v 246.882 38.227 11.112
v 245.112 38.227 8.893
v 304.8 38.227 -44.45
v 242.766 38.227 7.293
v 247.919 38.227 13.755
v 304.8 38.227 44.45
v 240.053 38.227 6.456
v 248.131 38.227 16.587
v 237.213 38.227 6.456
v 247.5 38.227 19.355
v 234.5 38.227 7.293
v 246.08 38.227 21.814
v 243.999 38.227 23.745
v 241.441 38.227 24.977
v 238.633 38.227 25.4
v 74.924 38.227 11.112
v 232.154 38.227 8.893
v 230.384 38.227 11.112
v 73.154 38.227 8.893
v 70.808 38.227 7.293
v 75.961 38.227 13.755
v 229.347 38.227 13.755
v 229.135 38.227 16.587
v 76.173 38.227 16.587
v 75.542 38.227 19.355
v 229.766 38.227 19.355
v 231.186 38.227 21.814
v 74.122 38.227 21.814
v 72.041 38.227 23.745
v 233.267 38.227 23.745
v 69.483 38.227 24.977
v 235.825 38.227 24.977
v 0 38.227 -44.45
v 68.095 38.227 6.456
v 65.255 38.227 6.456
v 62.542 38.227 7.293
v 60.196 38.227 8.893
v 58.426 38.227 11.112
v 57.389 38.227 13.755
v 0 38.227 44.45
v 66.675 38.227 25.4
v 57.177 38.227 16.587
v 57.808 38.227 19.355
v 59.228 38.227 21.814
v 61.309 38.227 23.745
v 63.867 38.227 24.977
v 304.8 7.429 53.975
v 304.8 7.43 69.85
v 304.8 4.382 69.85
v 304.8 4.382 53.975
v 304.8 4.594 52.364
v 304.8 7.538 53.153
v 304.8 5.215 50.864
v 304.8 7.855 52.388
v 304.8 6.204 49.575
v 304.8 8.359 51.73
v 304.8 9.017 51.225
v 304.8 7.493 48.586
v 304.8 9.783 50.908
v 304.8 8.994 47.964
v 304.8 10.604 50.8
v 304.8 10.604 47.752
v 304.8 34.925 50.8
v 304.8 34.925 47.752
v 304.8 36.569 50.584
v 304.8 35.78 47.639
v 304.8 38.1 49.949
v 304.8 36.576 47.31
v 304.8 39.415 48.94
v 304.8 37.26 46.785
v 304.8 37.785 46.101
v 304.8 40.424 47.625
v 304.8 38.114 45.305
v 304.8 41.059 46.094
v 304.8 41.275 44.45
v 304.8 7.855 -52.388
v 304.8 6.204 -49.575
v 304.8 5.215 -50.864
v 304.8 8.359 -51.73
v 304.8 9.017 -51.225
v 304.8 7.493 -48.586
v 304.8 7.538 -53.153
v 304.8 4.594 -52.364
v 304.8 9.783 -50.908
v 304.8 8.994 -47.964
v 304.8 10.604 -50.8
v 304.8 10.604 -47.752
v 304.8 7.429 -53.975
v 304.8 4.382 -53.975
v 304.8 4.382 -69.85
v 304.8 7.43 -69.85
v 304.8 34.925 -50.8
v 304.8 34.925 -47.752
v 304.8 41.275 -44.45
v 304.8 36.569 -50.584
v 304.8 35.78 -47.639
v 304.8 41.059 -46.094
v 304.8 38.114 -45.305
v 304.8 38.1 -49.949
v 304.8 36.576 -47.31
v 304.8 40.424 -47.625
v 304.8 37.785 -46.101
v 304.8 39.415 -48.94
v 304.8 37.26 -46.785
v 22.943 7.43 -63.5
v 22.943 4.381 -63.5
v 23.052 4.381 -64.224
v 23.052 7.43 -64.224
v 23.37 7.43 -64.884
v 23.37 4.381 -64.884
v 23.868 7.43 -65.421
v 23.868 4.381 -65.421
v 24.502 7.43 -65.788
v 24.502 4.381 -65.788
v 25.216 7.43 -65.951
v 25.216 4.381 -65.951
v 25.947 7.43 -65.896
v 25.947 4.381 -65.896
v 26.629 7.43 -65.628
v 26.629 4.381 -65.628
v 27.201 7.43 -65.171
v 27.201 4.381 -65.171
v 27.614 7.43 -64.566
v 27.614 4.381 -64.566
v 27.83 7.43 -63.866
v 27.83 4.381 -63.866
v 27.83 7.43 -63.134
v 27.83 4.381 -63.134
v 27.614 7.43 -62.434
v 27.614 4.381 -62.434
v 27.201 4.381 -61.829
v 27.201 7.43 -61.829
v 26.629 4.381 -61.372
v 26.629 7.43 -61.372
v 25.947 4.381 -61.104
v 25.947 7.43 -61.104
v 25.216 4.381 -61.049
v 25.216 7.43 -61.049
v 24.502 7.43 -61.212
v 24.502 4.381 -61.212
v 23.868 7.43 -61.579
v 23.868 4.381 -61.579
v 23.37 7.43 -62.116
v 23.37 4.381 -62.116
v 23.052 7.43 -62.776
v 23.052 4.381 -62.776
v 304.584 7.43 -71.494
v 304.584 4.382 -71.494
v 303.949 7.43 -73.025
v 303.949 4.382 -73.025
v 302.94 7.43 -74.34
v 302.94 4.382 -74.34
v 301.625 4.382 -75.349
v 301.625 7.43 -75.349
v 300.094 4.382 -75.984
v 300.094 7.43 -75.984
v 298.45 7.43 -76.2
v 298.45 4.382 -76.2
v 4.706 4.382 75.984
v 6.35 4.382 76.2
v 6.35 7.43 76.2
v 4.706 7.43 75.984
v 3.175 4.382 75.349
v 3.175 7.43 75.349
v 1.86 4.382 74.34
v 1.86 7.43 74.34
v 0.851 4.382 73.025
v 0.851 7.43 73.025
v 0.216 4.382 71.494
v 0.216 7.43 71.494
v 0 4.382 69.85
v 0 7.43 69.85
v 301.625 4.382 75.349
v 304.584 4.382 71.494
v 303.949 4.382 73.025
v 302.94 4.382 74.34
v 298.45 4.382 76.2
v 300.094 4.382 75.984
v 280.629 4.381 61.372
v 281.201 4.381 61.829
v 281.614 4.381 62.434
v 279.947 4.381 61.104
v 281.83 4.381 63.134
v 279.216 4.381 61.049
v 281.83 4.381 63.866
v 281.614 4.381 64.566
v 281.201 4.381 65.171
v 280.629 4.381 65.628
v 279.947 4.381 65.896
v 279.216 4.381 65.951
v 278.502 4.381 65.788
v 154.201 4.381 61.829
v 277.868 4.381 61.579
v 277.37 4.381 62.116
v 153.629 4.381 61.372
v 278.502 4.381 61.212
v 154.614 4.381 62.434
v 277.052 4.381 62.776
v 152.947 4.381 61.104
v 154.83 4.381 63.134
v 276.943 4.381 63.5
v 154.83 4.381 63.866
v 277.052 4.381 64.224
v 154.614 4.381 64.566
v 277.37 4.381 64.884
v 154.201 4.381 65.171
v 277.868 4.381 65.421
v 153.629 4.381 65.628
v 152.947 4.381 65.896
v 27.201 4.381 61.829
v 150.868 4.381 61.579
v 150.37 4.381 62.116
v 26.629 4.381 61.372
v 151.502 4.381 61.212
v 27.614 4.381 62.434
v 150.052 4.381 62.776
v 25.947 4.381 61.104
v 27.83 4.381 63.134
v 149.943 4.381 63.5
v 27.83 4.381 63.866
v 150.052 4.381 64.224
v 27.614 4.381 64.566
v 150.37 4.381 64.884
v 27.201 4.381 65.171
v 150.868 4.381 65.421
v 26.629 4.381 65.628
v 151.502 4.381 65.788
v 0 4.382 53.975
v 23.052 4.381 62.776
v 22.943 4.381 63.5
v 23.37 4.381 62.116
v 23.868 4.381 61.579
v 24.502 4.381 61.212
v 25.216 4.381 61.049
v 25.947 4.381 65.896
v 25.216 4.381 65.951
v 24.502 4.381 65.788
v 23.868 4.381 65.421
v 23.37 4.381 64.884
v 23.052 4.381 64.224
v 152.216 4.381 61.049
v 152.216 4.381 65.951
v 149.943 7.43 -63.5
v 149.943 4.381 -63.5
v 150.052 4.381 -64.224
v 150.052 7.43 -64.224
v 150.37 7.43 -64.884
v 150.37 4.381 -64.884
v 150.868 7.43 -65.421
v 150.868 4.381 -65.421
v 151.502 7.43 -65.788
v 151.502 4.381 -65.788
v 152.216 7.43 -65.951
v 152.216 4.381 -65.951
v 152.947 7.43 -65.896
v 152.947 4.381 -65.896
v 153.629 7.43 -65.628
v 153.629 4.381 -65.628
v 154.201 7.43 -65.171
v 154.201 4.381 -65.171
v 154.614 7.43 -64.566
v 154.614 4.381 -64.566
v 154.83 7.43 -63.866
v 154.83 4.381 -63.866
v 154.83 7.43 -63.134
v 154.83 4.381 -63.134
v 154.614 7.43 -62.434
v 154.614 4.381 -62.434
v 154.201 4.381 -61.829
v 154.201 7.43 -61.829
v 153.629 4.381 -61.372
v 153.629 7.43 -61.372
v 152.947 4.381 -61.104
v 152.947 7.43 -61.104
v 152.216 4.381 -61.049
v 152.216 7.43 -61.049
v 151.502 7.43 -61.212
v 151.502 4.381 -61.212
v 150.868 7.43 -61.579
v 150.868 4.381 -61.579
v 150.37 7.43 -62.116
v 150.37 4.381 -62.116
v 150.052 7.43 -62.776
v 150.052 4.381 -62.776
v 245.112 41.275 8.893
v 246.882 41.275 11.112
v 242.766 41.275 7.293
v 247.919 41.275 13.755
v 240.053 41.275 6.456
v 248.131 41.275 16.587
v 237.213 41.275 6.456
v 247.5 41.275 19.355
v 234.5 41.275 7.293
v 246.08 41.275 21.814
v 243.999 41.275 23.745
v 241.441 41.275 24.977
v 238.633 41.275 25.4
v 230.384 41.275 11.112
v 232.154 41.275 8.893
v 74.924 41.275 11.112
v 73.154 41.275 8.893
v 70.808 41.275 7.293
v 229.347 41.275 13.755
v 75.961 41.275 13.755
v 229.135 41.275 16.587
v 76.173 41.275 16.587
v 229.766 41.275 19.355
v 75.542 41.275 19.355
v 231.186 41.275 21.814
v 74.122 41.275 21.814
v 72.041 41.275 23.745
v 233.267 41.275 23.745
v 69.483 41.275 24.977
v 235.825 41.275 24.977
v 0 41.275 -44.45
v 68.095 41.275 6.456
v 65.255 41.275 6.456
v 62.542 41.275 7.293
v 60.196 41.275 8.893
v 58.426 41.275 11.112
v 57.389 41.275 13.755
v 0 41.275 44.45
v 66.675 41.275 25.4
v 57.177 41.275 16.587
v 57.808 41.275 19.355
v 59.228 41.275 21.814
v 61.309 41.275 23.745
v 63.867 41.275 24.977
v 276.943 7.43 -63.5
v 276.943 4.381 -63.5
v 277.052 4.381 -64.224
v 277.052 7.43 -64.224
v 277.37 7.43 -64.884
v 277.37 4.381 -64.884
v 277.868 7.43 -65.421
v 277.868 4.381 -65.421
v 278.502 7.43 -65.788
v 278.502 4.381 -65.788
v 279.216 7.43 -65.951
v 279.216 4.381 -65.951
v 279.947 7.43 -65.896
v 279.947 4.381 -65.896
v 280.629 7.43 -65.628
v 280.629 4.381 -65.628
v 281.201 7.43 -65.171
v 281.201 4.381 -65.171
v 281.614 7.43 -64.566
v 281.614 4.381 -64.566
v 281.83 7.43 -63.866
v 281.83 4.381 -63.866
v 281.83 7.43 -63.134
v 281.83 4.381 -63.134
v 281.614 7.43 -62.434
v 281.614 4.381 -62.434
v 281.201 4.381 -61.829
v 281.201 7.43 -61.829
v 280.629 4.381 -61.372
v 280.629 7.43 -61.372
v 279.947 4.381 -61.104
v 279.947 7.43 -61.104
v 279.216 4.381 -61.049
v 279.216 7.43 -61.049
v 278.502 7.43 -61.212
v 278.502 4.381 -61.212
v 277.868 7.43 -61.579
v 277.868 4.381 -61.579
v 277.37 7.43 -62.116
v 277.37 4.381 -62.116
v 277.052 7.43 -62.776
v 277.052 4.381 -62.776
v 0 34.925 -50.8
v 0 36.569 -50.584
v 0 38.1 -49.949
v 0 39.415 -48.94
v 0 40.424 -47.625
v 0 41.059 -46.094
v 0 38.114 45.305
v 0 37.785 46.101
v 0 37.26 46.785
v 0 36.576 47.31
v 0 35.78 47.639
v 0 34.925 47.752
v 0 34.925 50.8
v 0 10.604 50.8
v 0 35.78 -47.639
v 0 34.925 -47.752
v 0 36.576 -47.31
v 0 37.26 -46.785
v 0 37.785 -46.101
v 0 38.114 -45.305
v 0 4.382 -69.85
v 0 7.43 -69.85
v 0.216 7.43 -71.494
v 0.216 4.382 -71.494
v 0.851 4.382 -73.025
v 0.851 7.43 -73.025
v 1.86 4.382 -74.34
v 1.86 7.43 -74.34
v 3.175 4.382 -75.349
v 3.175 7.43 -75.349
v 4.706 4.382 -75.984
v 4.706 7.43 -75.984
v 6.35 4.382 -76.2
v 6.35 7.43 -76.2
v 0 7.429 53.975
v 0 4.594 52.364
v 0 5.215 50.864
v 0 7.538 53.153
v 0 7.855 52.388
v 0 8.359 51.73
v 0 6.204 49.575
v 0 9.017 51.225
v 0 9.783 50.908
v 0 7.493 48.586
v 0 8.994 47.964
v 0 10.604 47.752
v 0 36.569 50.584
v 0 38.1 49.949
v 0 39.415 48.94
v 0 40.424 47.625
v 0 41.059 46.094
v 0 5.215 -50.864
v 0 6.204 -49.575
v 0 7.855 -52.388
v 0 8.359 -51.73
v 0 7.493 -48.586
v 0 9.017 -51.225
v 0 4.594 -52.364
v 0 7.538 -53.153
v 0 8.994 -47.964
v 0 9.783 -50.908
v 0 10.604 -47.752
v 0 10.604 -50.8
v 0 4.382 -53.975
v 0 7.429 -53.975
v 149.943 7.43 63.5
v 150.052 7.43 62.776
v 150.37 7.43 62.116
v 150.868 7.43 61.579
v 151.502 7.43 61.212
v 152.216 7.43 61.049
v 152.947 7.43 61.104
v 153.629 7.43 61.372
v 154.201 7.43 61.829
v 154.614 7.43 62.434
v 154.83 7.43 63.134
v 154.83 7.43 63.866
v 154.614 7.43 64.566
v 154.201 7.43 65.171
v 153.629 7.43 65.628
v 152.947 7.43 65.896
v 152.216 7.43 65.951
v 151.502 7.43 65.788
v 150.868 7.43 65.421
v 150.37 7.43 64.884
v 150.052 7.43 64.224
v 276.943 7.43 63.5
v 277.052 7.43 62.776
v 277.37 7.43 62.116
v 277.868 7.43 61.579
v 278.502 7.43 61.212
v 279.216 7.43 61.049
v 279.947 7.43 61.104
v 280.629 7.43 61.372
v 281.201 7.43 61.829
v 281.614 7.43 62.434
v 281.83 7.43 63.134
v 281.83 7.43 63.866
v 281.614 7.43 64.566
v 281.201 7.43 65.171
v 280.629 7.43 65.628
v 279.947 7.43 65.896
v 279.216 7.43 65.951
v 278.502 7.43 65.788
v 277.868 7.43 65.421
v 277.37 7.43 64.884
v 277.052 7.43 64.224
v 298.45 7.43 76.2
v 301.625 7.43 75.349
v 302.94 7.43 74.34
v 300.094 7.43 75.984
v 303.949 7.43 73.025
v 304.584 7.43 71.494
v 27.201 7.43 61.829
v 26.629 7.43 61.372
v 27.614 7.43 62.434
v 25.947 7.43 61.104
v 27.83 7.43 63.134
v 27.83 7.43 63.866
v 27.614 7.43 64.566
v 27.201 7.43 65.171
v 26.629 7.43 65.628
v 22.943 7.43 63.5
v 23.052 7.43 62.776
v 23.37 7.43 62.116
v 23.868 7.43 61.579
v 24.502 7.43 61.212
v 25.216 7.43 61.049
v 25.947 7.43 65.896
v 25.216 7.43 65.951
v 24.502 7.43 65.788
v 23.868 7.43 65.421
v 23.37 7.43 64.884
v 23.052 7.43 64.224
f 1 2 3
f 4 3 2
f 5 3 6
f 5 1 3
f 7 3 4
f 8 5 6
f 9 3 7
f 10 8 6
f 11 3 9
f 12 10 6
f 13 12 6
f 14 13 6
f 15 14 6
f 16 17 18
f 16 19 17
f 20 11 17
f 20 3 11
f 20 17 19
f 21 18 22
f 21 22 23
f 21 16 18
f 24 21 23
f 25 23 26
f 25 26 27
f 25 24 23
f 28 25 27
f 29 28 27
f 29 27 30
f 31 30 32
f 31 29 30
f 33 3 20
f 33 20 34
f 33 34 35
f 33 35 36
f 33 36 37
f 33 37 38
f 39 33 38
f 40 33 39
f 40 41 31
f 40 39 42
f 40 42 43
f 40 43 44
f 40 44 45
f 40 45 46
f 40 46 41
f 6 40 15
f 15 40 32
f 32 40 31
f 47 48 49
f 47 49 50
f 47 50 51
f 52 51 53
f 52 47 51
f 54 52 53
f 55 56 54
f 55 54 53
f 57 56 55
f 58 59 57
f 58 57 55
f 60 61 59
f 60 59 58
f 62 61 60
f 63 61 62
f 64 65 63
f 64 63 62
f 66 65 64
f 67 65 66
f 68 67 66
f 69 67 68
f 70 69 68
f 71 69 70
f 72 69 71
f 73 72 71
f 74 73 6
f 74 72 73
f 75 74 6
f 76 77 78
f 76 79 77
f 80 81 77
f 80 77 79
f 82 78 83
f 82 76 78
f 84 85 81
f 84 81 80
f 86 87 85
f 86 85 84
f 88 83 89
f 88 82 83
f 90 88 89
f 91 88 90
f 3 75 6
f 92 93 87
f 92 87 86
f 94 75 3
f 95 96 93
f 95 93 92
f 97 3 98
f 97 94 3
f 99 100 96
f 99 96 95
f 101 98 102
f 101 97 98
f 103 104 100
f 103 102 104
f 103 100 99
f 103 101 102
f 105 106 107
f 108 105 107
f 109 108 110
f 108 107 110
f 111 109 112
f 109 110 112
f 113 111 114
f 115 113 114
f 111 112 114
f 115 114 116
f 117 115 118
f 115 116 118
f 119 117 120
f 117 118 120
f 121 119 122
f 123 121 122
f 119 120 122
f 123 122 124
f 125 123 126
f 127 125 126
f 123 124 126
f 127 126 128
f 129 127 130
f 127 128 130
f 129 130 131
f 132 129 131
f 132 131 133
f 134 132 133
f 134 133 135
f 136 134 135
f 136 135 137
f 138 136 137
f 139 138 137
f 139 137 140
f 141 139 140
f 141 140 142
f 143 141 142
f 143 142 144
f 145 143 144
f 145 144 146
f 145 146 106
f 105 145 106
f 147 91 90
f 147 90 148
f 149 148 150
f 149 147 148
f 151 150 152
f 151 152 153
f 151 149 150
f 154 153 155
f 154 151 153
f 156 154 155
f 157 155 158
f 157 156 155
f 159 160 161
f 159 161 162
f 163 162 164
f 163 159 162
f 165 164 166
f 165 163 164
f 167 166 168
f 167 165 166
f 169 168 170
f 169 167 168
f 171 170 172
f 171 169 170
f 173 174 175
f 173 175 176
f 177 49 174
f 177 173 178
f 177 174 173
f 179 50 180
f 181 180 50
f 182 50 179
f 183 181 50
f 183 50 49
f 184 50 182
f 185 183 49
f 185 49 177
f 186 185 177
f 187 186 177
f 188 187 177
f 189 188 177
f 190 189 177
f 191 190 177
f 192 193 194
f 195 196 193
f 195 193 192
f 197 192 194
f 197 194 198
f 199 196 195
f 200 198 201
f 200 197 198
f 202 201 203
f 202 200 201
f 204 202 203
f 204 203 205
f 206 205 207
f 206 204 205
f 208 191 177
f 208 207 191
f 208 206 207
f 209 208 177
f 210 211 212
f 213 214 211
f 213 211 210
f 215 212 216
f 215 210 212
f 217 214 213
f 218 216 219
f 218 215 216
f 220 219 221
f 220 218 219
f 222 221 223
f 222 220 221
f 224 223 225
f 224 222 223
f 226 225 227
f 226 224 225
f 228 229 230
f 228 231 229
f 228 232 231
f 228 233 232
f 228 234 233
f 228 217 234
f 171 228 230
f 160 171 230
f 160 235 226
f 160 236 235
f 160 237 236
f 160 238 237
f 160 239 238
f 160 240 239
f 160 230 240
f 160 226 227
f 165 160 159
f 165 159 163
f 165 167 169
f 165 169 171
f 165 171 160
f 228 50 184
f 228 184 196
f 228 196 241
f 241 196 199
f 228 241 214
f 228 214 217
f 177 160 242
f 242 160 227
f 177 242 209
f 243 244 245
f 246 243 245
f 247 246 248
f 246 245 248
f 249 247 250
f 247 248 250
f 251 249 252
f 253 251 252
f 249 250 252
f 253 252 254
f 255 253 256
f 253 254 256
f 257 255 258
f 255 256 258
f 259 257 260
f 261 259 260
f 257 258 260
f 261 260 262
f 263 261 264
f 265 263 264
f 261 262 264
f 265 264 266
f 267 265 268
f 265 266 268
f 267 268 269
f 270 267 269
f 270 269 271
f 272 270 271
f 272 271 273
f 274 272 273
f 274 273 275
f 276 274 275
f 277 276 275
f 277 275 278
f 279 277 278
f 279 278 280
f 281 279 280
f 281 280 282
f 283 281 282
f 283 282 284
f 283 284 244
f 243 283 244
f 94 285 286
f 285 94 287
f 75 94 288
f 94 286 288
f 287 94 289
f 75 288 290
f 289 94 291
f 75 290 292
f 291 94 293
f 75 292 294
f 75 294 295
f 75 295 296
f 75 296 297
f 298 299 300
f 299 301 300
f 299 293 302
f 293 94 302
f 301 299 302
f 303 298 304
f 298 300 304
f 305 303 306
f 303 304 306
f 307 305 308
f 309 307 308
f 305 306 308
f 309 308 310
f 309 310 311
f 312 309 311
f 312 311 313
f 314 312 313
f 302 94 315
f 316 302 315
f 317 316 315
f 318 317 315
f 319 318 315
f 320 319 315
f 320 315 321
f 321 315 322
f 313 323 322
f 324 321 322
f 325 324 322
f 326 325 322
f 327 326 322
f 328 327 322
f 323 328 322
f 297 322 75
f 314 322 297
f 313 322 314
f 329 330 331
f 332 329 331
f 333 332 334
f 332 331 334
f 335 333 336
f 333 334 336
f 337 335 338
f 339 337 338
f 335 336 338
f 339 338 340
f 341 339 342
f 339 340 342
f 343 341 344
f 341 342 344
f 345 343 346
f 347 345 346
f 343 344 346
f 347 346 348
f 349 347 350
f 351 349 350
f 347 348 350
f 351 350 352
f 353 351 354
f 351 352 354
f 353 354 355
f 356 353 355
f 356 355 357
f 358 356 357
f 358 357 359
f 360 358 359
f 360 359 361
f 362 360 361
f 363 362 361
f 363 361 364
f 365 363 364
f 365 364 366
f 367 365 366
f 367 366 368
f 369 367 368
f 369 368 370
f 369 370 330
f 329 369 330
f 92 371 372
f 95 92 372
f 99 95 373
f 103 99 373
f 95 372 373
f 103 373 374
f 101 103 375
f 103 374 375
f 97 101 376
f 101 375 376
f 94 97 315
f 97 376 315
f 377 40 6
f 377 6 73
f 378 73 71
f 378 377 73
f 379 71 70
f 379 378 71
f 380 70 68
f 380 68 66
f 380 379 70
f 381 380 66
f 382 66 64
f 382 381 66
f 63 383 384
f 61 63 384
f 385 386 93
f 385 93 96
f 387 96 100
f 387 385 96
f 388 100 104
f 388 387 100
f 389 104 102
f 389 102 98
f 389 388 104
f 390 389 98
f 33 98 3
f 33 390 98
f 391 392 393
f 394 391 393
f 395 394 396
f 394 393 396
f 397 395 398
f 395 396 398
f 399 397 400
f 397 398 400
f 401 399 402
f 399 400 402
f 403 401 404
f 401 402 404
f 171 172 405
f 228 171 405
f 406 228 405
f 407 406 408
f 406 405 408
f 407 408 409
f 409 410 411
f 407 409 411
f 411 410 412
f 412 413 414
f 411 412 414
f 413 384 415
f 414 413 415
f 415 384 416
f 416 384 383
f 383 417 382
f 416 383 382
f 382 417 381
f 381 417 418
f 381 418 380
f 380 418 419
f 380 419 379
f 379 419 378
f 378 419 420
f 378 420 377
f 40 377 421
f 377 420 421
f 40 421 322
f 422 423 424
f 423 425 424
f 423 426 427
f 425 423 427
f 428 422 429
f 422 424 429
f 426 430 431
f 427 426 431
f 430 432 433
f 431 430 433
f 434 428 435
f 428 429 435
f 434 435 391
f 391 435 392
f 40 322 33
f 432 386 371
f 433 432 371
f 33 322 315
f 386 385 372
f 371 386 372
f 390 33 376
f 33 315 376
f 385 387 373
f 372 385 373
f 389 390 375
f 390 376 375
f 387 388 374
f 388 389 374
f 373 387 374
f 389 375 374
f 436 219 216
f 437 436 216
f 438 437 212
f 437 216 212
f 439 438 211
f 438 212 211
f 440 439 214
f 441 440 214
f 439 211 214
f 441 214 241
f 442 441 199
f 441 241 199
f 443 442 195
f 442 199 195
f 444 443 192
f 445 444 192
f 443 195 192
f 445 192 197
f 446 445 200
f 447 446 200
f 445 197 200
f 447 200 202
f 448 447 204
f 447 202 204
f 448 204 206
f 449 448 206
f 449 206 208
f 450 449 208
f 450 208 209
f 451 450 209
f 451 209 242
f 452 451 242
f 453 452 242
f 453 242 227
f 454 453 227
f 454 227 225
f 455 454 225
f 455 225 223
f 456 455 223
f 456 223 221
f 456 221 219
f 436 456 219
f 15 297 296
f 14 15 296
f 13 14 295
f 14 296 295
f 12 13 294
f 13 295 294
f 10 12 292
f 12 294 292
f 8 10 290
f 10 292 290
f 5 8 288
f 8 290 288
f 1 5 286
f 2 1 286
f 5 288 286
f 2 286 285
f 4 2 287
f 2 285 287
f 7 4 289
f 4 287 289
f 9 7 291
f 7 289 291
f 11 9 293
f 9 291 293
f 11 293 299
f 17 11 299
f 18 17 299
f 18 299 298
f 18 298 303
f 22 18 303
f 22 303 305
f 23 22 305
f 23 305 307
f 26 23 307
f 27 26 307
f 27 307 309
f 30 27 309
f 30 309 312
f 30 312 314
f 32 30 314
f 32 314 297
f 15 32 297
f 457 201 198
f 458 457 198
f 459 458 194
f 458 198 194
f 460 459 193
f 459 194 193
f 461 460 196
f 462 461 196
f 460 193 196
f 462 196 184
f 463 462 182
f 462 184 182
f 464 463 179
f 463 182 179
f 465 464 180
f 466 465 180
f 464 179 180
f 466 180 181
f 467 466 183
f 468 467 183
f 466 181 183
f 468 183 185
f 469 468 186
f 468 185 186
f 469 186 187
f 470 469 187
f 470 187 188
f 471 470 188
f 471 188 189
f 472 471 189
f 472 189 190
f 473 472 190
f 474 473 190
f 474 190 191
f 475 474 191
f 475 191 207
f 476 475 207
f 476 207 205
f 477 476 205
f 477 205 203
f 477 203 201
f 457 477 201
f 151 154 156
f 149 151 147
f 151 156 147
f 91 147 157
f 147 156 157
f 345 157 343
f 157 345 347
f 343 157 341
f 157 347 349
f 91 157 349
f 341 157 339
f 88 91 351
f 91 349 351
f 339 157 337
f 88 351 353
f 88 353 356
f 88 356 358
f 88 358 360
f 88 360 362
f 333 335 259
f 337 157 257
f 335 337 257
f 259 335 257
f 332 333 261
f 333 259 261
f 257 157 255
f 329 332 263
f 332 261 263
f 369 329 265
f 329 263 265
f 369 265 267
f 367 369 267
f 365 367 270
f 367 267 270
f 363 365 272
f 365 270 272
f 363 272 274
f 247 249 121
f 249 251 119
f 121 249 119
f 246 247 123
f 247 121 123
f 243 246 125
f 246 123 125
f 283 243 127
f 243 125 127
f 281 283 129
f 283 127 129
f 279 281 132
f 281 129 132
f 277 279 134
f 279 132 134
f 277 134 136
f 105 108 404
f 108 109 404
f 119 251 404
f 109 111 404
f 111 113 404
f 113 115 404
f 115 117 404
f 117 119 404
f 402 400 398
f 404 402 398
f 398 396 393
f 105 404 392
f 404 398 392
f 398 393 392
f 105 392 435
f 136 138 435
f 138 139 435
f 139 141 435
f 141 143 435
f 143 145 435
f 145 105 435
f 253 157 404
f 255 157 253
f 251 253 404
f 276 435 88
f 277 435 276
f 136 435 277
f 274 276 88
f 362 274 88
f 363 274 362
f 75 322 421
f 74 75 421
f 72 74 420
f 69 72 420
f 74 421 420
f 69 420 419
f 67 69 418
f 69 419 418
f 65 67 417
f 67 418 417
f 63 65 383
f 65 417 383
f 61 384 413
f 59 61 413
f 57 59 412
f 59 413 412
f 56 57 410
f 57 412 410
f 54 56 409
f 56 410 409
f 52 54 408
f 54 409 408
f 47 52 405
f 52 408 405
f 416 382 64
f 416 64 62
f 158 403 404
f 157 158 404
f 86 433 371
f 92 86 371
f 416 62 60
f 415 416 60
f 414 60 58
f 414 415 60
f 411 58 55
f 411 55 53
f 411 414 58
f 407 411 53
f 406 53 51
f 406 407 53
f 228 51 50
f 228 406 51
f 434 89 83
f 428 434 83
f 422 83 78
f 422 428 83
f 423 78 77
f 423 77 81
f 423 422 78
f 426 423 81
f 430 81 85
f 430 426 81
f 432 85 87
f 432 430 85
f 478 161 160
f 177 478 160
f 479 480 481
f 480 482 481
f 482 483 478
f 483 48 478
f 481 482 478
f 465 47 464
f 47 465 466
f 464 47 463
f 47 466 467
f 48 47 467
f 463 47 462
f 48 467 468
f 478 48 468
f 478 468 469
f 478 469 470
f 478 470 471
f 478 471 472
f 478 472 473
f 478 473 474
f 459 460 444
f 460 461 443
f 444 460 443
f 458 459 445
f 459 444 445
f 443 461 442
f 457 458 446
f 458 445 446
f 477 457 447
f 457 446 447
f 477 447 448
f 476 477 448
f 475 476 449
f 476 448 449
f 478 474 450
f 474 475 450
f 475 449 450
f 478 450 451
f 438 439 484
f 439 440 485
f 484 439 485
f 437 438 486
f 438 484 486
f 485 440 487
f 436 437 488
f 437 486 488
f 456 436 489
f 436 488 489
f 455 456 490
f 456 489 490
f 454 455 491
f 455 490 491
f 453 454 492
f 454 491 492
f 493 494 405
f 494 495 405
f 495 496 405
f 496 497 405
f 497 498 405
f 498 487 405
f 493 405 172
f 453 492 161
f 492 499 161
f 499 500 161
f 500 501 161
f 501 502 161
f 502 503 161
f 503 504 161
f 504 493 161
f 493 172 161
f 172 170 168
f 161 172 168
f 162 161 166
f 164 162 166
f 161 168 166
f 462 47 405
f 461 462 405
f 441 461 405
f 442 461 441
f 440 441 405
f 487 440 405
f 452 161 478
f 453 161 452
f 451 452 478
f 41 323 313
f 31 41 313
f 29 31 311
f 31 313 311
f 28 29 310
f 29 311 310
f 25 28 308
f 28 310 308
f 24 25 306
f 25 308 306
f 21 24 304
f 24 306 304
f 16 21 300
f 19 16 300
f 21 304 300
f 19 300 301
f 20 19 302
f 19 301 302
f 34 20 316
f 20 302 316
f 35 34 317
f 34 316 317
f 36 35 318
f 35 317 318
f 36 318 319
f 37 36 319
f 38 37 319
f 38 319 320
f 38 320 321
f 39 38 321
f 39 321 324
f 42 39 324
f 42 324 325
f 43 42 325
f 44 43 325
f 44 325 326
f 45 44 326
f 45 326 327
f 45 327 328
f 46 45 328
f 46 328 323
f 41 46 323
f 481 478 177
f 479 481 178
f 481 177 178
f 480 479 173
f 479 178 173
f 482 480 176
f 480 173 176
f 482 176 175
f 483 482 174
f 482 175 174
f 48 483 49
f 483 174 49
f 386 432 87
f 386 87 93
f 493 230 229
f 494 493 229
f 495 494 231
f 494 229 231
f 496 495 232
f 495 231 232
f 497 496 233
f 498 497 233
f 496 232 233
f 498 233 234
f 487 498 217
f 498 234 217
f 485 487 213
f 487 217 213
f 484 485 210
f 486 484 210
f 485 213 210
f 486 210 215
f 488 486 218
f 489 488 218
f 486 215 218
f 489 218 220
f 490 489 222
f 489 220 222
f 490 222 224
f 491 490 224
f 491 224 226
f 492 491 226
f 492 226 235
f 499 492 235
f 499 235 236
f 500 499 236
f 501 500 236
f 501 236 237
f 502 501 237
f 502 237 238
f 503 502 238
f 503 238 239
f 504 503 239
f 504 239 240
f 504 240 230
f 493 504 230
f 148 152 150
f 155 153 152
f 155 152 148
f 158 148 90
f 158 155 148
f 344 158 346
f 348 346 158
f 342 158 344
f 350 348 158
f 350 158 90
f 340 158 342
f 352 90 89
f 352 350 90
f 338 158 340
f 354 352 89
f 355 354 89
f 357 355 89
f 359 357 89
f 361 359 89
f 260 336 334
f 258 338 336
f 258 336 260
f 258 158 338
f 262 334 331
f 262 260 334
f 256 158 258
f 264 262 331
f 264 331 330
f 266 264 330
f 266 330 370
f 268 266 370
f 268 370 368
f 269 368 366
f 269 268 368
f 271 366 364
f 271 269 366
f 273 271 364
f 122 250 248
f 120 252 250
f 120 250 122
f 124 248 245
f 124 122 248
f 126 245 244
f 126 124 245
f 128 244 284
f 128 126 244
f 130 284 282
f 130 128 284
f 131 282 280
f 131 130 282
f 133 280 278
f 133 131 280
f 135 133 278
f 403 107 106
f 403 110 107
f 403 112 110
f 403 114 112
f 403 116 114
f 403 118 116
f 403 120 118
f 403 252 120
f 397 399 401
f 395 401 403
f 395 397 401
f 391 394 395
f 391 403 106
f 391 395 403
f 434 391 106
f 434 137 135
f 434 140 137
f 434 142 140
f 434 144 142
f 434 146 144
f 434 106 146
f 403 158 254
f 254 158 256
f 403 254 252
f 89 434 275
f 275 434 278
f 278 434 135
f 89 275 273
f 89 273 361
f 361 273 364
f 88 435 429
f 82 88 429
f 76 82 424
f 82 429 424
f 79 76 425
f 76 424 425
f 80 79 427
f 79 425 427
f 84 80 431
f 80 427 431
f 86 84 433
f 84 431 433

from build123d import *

# Parameters (mm, degrees)
BOSS_EXTRUDE1_DEPTH              = 304.8
SKETCH2_R                        = 2.3876
CUT_EXTRUDE1_DEPTH               = 317.354227758
SKETCH3_R                        = 9.525
CUT_EXTRUDE2_DEPTH               = 304.8
LPATTERN1_COUNT                  = 2
LPATTERN1_PITCH                  = 171.958
FILLET1_R                        = 6.35
CONVERT_SOLID1_DEPTH             = 304.8
F_10_0_1935_DIAMETER_HOLE1_D     = 4.9149
F_10_0_1935_DIAMETER_HOLE1_DEPTH = 3.048


# Read off the part's stored shape, not the designer's step: Convert-Solid1
with BuildPart() as part:
    # Sketch1 → Boss-Extrude1 (new body)
    with BuildSketch(Plane(origin=(0, 0, 0), x_dir=(0, 0, -1), z_dir=(1, 0, 0))):
        with BuildLine():
            Line((-76.2, 4.2545), (-53.975, 4.2545))
            ThreePointArc((-53.975, 4.2545), (-49.484871939, 6.114371939), (-47.625, 10.6045))
            Line((-47.625, 10.6045), (-47.625, 34.925))
            ThreePointArc((-47.625, 34.925), (-46.69506403, 37.17006403), (-44.45, 38.1))
            Line((-44.45, 38.1), (44.45, 38.1))
            ThreePointArc((44.45, 38.1), (46.69506403, 37.17006403), (47.625, 34.925))
            Line((47.625, 34.925), (47.625, 10.6045))
            ThreePointArc((47.625, 10.6045), (49.484871939, 6.114371939), (53.975, 4.2545))
            Line((53.975, 4.2545), (76.2, 4.2545))
            Line((76.2, 4.2545), (76.2, 7.4295))
            Line((76.2, 7.4295), (53.975, 7.4295))
            ThreePointArc((53.975, 7.4295), (51.72993597, 8.35943597), (50.8, 10.6045))
            Line((50.8, 10.6045), (50.8, 34.925))
            ThreePointArc((50.8, 34.925), (48.940128061, 39.415128061), (44.45, 41.275))
            Line((44.45, 41.275), (-44.45, 41.275))
            ThreePointArc((-44.45, 41.275), (-48.940128061, 39.415128061), (-50.8, 34.925))
            Line((-50.8, 34.925), (-50.8, 10.6045))
            ThreePointArc((-50.8, 10.6045), (-51.72993597, 8.35943597), (-53.975, 7.4295))
            Line((-53.975, 7.4295), (-76.2, 7.4295))
            Line((-76.2, 7.4295), (-76.2, 4.2545))
        make_face()
    extrude(amount=BOSS_EXTRUDE1_DEPTH)

    # Sketch2 → Cut-Extrude1 (cut, through all)
    with BuildSketch(Plane.XZ.offset(-4.2545)):
        with Locations(Location((25.4, 63.5, 0), (0, 0, 270))):
            Circle(SKETCH2_R)
        with Locations(Location((152.4, 63.5, 0), (0, 0, 270))):
            Circle(SKETCH2_R)
        with Locations(Location((279.4, 63.5, 0), (0, 0, 270))):
            Circle(SKETCH2_R)
    cut_extrude1 = extrude(amount=-CUT_EXTRUDE1_DEPTH, mode=Mode.SUBTRACT)

    # Mirror1: Cut-Extrude1 across plane
    add(cut_extrude1.mirror(Plane.XY), mode=Mode.SUBTRACT)

    # Sketch3 → Cut-Extrude2 (cut)
    with BuildSketch(Plane(origin=(0, 41.275, 0), x_dir=(1, 0, 0), z_dir=(0, 1, 0))):
        with Locations(Location((66.675, -15.875, 0), (0, 0, 270))):
            Circle(SKETCH3_R)
    cut_extrude2 = extrude(amount=-CUT_EXTRUDE2_DEPTH, mode=Mode.SUBTRACT)

    # LPattern1: Cut-Extrude2 ×2
    with Locations(*[(i * LPATTERN1_PITCH, 0, 0) for i in range(1, LPATTERN1_COUNT)]):
        add(cut_extrude2, mode=Mode.SUBTRACT)

    # Fillet1
    fillet1_edges = [part.edges().sort_by_distance(p)[0] for p in [
        (0, 5.842, -76.2),
        (0, 5.842, 76.2),
        (304.8, 5.842, -76.2),
        (304.8, 5.842, 76.2),
    ]]
    fillet(fillet1_edges, radius=FILLET1_R)

    # Convert-Solid1 outline → Convert-Solid1 (cut)
    with BuildSketch(Plane.YZ):
        with BuildLine():
            Line((4.3815, -76.2), (4.3815, -53.975))
            ThreePointArc((4.3815, -53.975), (6.204174501, -49.574674501), (10.6045, -47.752))
            Line((10.6045, -47.752), (34.925, -47.752))
            ThreePointArc((34.925, -47.752), (37.259866591, -46.784866591), (38.227, -44.45))
            Line((38.227, -44.45), (38.227, 44.45))
            ThreePointArc((38.227, 44.45), (37.259866591, 46.784866591), (34.925, 47.752))
            Line((34.925, 47.752), (10.6045, 47.752))
            ThreePointArc((10.6045, 47.752), (6.204174501, 49.574674501), (4.3815, 53.975))
            Line((4.3815, 53.975), (4.3815, 76.2))
            Line((4.3815, 76.2), (4.2545, 76.2))
            Line((4.2545, 76.2), (4.2545, 53.975))
            ThreePointArc((4.2545, 53.975), (6.114371939, 49.484871939), (10.6045, 47.625))
            Line((10.6045, 47.625), (34.925, 47.625))
            ThreePointArc((34.925, 47.625), (37.17006403, 46.69506403), (38.1, 44.45))
            Line((38.1, 44.45), (38.1, -44.45))
            ThreePointArc((38.1, -44.45), (37.17006403, -46.69506403), (34.925, -47.625))
            Line((34.925, -47.625), (10.6045, -47.625))
            ThreePointArc((10.6045, -47.625), (6.114371939, -49.484871939), (4.2545, -53.975))
            Line((4.2545, -53.975), (4.2545, -76.2))
            Line((4.2545, -76.2), (4.3815, -76.2))
        make_face()
    extrude(amount=CONVERT_SOLID1_DEPTH, mode=Mode.SUBTRACT)

    # #10 (0.1935) Diameter Hole1
    with Locations(Plane(origin=(0, 7.4295, 0), x_dir=(1, 0, 0), z_dir=(0, 1, 0))):
        with Locations((25.4, 63.5), (152.4, 63.5), (279.4, 63.5), (279.4, -63.5), (152.4, -63.5), (25.4, -63.5)):
            Hole(F_10_0_1935_DIAMETER_HOLE1_D / 2, depth=F_10_0_1935_DIAMETER_HOLE1_DEPTH)


solid = part.part
